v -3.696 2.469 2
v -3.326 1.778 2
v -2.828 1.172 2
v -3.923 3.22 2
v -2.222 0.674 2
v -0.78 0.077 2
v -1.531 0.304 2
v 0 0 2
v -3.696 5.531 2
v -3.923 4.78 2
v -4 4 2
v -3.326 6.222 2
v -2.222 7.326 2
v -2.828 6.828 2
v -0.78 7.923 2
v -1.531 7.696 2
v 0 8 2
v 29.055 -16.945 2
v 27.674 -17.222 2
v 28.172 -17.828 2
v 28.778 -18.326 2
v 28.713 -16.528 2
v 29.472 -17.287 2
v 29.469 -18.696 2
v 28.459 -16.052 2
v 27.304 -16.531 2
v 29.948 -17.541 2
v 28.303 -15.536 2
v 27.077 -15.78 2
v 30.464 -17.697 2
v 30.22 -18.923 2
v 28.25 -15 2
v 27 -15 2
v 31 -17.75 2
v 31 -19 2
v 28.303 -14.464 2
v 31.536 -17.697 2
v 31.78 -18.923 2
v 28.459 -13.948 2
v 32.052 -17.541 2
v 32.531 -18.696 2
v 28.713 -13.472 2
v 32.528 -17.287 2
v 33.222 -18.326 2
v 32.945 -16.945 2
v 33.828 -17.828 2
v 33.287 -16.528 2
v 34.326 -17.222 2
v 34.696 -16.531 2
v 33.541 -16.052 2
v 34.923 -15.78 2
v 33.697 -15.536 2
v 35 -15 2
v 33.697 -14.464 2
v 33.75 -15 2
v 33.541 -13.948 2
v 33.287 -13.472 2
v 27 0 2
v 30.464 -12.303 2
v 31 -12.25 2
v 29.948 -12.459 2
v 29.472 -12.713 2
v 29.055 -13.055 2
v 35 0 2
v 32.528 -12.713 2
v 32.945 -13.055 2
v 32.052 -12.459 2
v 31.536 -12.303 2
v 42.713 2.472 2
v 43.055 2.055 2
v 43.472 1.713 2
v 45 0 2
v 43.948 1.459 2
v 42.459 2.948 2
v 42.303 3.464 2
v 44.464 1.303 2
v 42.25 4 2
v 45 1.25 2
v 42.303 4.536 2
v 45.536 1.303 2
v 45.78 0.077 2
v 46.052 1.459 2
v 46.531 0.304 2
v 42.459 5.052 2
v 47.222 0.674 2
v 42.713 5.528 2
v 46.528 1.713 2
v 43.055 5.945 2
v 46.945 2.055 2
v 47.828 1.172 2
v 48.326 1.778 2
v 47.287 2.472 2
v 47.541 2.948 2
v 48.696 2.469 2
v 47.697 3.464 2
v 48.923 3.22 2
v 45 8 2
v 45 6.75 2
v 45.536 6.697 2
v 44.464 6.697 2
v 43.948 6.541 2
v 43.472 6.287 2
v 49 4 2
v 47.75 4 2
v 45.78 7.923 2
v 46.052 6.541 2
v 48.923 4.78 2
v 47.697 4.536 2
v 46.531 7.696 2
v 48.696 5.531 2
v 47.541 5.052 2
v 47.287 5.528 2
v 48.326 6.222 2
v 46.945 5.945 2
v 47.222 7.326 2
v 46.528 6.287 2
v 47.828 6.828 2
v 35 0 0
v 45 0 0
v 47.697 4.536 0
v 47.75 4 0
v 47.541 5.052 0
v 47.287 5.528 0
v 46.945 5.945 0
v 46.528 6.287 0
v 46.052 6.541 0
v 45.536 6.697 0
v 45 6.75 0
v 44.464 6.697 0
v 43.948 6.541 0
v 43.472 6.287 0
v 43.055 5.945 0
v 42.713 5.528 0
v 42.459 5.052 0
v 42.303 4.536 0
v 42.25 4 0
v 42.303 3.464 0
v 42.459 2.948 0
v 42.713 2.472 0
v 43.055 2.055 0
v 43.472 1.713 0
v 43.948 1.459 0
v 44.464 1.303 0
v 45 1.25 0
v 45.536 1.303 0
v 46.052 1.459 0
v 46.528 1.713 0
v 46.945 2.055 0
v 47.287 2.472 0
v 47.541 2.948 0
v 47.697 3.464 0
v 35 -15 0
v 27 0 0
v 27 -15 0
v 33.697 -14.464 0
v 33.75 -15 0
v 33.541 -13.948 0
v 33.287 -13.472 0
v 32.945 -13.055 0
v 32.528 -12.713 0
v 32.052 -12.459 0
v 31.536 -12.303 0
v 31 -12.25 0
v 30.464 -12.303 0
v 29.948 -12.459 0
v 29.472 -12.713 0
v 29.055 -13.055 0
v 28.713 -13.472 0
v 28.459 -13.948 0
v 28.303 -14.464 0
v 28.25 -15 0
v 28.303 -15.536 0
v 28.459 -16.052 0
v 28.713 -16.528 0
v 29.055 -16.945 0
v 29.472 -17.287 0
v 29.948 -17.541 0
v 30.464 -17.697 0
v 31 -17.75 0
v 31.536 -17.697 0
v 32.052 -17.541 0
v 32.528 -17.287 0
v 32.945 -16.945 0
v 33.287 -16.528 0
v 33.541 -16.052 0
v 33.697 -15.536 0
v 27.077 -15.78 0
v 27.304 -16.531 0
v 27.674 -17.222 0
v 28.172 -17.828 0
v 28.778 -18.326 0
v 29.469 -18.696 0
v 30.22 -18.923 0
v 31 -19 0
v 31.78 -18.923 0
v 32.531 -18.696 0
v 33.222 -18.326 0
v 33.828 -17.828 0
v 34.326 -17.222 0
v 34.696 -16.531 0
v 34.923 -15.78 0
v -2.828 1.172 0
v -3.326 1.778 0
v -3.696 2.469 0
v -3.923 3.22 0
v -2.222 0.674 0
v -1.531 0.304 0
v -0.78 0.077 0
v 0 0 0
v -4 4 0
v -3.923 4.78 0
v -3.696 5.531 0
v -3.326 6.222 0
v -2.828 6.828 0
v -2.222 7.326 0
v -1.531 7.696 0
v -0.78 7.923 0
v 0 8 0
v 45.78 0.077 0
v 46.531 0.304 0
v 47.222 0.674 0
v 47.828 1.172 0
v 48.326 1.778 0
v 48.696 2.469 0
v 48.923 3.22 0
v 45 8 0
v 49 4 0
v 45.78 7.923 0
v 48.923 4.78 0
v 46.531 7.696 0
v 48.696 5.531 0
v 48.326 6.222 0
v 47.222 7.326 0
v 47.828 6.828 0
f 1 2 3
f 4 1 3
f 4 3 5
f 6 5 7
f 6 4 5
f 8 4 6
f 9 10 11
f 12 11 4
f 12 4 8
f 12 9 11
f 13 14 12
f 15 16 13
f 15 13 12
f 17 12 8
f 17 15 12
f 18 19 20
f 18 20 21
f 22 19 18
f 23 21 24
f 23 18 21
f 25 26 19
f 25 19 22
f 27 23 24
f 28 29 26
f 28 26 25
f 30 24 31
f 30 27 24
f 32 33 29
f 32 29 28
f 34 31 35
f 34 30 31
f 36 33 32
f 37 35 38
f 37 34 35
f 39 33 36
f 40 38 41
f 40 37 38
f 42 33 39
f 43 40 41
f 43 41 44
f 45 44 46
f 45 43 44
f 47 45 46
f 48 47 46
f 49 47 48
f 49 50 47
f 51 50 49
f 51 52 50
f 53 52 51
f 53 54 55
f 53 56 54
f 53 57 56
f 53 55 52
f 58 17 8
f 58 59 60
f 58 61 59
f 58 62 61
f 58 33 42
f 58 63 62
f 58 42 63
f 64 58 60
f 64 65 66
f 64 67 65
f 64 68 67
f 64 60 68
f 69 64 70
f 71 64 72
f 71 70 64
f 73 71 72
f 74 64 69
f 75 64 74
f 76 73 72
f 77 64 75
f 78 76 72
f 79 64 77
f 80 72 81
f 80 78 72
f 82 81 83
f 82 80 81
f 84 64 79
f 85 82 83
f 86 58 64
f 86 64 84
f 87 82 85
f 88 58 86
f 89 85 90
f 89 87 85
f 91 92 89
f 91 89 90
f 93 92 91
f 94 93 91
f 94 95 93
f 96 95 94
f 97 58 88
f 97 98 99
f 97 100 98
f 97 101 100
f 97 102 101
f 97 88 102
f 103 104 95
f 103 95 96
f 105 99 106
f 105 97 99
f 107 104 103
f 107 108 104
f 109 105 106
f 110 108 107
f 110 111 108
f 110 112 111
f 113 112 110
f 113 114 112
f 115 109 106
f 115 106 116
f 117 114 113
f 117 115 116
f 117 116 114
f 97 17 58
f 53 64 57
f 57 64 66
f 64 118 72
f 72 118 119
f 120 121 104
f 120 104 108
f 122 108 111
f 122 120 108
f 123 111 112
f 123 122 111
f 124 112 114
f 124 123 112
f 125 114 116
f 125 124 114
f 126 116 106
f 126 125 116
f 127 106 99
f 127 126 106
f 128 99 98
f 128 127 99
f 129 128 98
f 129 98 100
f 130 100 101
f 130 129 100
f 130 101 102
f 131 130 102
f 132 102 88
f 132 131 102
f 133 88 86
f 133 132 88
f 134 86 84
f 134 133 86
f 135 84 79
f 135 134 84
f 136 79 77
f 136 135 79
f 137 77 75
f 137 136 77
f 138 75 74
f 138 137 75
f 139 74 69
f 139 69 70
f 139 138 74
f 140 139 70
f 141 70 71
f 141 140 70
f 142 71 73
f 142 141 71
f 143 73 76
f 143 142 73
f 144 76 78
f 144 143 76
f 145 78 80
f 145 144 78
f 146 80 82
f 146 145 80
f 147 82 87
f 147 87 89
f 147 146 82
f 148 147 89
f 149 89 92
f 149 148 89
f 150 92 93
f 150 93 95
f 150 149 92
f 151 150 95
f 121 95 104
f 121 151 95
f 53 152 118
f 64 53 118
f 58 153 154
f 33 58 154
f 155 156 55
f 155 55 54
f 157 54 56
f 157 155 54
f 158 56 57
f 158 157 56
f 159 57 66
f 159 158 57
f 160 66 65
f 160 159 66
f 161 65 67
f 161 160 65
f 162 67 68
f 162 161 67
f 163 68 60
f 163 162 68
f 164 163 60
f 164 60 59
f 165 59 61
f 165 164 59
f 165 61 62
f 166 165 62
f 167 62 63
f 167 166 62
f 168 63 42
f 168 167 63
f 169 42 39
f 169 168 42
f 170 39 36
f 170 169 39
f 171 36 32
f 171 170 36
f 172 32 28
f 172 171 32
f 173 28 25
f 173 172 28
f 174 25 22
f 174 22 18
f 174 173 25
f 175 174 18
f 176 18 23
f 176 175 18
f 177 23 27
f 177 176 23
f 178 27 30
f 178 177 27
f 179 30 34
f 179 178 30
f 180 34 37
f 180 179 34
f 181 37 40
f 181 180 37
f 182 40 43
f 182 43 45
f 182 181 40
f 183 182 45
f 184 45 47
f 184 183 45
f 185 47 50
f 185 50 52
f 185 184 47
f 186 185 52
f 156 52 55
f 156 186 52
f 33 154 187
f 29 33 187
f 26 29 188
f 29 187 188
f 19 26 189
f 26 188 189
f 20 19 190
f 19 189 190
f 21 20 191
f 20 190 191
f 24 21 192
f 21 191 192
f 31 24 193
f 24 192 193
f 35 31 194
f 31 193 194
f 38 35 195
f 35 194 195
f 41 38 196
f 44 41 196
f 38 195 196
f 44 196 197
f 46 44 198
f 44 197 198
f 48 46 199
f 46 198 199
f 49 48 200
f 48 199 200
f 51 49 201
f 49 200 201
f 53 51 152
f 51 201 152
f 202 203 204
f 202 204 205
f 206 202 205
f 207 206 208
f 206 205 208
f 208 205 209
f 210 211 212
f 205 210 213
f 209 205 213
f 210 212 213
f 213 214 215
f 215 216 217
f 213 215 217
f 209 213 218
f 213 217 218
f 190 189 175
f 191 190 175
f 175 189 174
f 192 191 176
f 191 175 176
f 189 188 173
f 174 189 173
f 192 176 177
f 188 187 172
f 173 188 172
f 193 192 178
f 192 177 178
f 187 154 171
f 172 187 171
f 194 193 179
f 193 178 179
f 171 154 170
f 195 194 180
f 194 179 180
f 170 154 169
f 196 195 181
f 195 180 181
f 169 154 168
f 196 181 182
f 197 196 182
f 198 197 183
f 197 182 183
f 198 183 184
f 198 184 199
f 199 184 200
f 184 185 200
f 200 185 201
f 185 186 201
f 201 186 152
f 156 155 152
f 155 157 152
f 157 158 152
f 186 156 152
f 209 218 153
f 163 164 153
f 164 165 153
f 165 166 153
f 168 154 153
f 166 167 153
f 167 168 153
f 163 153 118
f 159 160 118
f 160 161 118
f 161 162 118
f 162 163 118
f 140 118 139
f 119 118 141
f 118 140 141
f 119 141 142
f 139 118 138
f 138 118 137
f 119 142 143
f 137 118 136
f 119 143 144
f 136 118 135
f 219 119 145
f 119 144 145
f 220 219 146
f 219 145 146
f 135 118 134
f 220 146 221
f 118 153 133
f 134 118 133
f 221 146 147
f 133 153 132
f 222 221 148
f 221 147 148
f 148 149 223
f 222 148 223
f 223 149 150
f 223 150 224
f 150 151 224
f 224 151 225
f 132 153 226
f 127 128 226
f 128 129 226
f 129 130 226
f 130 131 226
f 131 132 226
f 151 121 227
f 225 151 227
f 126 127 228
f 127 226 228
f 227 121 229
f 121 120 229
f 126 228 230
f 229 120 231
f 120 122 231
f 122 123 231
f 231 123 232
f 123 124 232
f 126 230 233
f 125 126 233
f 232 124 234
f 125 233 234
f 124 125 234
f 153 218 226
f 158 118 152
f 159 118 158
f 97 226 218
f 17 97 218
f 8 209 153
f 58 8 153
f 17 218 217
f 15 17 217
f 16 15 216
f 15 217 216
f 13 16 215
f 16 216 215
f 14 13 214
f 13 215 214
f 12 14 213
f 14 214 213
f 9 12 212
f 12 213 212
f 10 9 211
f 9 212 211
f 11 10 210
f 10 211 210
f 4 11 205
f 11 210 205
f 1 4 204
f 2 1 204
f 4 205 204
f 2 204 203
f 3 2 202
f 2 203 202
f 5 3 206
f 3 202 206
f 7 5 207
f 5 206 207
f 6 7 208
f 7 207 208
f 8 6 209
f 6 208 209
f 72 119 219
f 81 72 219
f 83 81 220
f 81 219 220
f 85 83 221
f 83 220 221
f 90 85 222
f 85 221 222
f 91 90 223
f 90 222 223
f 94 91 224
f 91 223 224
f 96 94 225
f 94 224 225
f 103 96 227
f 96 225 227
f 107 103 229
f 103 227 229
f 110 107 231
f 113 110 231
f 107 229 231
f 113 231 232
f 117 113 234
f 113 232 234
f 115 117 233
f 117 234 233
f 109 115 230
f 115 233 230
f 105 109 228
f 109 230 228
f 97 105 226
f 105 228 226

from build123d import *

# Parameters (mm, degrees)
SKETCH1_R           = 2.75
BOSS_EXTRUDE2_DEPTH = 2


with BuildPart() as part:
    # Sketch1 → Boss-Extrude2 (new body)
    with BuildSketch(Plane.XY):
        with BuildLine():
            Line((35, 0), (45, 0))
            ThreePointArc((45, 0), (49, 4), (45, 8))
            Line((45, 8), (0, 8))
            ThreePointArc((0, 8), (-4, 4), (0, 0))
            Line((0, 0), (27, 0))
            Line((27, 0), (27, -15))
            ThreePointArc((27, -15), (31, -19), (35, -15))
            Line((35, -15), (35, 0))
        make_face()
        with Locations((45, 4)):
            Circle(SKETCH1_R, mode=Mode.SUBTRACT)
        with Locations((31, -15)):
            Circle(SKETCH1_R, mode=Mode.SUBTRACT)
    extrude(amount=BOSS_EXTRUDE2_DEPTH)


solid = part.part
